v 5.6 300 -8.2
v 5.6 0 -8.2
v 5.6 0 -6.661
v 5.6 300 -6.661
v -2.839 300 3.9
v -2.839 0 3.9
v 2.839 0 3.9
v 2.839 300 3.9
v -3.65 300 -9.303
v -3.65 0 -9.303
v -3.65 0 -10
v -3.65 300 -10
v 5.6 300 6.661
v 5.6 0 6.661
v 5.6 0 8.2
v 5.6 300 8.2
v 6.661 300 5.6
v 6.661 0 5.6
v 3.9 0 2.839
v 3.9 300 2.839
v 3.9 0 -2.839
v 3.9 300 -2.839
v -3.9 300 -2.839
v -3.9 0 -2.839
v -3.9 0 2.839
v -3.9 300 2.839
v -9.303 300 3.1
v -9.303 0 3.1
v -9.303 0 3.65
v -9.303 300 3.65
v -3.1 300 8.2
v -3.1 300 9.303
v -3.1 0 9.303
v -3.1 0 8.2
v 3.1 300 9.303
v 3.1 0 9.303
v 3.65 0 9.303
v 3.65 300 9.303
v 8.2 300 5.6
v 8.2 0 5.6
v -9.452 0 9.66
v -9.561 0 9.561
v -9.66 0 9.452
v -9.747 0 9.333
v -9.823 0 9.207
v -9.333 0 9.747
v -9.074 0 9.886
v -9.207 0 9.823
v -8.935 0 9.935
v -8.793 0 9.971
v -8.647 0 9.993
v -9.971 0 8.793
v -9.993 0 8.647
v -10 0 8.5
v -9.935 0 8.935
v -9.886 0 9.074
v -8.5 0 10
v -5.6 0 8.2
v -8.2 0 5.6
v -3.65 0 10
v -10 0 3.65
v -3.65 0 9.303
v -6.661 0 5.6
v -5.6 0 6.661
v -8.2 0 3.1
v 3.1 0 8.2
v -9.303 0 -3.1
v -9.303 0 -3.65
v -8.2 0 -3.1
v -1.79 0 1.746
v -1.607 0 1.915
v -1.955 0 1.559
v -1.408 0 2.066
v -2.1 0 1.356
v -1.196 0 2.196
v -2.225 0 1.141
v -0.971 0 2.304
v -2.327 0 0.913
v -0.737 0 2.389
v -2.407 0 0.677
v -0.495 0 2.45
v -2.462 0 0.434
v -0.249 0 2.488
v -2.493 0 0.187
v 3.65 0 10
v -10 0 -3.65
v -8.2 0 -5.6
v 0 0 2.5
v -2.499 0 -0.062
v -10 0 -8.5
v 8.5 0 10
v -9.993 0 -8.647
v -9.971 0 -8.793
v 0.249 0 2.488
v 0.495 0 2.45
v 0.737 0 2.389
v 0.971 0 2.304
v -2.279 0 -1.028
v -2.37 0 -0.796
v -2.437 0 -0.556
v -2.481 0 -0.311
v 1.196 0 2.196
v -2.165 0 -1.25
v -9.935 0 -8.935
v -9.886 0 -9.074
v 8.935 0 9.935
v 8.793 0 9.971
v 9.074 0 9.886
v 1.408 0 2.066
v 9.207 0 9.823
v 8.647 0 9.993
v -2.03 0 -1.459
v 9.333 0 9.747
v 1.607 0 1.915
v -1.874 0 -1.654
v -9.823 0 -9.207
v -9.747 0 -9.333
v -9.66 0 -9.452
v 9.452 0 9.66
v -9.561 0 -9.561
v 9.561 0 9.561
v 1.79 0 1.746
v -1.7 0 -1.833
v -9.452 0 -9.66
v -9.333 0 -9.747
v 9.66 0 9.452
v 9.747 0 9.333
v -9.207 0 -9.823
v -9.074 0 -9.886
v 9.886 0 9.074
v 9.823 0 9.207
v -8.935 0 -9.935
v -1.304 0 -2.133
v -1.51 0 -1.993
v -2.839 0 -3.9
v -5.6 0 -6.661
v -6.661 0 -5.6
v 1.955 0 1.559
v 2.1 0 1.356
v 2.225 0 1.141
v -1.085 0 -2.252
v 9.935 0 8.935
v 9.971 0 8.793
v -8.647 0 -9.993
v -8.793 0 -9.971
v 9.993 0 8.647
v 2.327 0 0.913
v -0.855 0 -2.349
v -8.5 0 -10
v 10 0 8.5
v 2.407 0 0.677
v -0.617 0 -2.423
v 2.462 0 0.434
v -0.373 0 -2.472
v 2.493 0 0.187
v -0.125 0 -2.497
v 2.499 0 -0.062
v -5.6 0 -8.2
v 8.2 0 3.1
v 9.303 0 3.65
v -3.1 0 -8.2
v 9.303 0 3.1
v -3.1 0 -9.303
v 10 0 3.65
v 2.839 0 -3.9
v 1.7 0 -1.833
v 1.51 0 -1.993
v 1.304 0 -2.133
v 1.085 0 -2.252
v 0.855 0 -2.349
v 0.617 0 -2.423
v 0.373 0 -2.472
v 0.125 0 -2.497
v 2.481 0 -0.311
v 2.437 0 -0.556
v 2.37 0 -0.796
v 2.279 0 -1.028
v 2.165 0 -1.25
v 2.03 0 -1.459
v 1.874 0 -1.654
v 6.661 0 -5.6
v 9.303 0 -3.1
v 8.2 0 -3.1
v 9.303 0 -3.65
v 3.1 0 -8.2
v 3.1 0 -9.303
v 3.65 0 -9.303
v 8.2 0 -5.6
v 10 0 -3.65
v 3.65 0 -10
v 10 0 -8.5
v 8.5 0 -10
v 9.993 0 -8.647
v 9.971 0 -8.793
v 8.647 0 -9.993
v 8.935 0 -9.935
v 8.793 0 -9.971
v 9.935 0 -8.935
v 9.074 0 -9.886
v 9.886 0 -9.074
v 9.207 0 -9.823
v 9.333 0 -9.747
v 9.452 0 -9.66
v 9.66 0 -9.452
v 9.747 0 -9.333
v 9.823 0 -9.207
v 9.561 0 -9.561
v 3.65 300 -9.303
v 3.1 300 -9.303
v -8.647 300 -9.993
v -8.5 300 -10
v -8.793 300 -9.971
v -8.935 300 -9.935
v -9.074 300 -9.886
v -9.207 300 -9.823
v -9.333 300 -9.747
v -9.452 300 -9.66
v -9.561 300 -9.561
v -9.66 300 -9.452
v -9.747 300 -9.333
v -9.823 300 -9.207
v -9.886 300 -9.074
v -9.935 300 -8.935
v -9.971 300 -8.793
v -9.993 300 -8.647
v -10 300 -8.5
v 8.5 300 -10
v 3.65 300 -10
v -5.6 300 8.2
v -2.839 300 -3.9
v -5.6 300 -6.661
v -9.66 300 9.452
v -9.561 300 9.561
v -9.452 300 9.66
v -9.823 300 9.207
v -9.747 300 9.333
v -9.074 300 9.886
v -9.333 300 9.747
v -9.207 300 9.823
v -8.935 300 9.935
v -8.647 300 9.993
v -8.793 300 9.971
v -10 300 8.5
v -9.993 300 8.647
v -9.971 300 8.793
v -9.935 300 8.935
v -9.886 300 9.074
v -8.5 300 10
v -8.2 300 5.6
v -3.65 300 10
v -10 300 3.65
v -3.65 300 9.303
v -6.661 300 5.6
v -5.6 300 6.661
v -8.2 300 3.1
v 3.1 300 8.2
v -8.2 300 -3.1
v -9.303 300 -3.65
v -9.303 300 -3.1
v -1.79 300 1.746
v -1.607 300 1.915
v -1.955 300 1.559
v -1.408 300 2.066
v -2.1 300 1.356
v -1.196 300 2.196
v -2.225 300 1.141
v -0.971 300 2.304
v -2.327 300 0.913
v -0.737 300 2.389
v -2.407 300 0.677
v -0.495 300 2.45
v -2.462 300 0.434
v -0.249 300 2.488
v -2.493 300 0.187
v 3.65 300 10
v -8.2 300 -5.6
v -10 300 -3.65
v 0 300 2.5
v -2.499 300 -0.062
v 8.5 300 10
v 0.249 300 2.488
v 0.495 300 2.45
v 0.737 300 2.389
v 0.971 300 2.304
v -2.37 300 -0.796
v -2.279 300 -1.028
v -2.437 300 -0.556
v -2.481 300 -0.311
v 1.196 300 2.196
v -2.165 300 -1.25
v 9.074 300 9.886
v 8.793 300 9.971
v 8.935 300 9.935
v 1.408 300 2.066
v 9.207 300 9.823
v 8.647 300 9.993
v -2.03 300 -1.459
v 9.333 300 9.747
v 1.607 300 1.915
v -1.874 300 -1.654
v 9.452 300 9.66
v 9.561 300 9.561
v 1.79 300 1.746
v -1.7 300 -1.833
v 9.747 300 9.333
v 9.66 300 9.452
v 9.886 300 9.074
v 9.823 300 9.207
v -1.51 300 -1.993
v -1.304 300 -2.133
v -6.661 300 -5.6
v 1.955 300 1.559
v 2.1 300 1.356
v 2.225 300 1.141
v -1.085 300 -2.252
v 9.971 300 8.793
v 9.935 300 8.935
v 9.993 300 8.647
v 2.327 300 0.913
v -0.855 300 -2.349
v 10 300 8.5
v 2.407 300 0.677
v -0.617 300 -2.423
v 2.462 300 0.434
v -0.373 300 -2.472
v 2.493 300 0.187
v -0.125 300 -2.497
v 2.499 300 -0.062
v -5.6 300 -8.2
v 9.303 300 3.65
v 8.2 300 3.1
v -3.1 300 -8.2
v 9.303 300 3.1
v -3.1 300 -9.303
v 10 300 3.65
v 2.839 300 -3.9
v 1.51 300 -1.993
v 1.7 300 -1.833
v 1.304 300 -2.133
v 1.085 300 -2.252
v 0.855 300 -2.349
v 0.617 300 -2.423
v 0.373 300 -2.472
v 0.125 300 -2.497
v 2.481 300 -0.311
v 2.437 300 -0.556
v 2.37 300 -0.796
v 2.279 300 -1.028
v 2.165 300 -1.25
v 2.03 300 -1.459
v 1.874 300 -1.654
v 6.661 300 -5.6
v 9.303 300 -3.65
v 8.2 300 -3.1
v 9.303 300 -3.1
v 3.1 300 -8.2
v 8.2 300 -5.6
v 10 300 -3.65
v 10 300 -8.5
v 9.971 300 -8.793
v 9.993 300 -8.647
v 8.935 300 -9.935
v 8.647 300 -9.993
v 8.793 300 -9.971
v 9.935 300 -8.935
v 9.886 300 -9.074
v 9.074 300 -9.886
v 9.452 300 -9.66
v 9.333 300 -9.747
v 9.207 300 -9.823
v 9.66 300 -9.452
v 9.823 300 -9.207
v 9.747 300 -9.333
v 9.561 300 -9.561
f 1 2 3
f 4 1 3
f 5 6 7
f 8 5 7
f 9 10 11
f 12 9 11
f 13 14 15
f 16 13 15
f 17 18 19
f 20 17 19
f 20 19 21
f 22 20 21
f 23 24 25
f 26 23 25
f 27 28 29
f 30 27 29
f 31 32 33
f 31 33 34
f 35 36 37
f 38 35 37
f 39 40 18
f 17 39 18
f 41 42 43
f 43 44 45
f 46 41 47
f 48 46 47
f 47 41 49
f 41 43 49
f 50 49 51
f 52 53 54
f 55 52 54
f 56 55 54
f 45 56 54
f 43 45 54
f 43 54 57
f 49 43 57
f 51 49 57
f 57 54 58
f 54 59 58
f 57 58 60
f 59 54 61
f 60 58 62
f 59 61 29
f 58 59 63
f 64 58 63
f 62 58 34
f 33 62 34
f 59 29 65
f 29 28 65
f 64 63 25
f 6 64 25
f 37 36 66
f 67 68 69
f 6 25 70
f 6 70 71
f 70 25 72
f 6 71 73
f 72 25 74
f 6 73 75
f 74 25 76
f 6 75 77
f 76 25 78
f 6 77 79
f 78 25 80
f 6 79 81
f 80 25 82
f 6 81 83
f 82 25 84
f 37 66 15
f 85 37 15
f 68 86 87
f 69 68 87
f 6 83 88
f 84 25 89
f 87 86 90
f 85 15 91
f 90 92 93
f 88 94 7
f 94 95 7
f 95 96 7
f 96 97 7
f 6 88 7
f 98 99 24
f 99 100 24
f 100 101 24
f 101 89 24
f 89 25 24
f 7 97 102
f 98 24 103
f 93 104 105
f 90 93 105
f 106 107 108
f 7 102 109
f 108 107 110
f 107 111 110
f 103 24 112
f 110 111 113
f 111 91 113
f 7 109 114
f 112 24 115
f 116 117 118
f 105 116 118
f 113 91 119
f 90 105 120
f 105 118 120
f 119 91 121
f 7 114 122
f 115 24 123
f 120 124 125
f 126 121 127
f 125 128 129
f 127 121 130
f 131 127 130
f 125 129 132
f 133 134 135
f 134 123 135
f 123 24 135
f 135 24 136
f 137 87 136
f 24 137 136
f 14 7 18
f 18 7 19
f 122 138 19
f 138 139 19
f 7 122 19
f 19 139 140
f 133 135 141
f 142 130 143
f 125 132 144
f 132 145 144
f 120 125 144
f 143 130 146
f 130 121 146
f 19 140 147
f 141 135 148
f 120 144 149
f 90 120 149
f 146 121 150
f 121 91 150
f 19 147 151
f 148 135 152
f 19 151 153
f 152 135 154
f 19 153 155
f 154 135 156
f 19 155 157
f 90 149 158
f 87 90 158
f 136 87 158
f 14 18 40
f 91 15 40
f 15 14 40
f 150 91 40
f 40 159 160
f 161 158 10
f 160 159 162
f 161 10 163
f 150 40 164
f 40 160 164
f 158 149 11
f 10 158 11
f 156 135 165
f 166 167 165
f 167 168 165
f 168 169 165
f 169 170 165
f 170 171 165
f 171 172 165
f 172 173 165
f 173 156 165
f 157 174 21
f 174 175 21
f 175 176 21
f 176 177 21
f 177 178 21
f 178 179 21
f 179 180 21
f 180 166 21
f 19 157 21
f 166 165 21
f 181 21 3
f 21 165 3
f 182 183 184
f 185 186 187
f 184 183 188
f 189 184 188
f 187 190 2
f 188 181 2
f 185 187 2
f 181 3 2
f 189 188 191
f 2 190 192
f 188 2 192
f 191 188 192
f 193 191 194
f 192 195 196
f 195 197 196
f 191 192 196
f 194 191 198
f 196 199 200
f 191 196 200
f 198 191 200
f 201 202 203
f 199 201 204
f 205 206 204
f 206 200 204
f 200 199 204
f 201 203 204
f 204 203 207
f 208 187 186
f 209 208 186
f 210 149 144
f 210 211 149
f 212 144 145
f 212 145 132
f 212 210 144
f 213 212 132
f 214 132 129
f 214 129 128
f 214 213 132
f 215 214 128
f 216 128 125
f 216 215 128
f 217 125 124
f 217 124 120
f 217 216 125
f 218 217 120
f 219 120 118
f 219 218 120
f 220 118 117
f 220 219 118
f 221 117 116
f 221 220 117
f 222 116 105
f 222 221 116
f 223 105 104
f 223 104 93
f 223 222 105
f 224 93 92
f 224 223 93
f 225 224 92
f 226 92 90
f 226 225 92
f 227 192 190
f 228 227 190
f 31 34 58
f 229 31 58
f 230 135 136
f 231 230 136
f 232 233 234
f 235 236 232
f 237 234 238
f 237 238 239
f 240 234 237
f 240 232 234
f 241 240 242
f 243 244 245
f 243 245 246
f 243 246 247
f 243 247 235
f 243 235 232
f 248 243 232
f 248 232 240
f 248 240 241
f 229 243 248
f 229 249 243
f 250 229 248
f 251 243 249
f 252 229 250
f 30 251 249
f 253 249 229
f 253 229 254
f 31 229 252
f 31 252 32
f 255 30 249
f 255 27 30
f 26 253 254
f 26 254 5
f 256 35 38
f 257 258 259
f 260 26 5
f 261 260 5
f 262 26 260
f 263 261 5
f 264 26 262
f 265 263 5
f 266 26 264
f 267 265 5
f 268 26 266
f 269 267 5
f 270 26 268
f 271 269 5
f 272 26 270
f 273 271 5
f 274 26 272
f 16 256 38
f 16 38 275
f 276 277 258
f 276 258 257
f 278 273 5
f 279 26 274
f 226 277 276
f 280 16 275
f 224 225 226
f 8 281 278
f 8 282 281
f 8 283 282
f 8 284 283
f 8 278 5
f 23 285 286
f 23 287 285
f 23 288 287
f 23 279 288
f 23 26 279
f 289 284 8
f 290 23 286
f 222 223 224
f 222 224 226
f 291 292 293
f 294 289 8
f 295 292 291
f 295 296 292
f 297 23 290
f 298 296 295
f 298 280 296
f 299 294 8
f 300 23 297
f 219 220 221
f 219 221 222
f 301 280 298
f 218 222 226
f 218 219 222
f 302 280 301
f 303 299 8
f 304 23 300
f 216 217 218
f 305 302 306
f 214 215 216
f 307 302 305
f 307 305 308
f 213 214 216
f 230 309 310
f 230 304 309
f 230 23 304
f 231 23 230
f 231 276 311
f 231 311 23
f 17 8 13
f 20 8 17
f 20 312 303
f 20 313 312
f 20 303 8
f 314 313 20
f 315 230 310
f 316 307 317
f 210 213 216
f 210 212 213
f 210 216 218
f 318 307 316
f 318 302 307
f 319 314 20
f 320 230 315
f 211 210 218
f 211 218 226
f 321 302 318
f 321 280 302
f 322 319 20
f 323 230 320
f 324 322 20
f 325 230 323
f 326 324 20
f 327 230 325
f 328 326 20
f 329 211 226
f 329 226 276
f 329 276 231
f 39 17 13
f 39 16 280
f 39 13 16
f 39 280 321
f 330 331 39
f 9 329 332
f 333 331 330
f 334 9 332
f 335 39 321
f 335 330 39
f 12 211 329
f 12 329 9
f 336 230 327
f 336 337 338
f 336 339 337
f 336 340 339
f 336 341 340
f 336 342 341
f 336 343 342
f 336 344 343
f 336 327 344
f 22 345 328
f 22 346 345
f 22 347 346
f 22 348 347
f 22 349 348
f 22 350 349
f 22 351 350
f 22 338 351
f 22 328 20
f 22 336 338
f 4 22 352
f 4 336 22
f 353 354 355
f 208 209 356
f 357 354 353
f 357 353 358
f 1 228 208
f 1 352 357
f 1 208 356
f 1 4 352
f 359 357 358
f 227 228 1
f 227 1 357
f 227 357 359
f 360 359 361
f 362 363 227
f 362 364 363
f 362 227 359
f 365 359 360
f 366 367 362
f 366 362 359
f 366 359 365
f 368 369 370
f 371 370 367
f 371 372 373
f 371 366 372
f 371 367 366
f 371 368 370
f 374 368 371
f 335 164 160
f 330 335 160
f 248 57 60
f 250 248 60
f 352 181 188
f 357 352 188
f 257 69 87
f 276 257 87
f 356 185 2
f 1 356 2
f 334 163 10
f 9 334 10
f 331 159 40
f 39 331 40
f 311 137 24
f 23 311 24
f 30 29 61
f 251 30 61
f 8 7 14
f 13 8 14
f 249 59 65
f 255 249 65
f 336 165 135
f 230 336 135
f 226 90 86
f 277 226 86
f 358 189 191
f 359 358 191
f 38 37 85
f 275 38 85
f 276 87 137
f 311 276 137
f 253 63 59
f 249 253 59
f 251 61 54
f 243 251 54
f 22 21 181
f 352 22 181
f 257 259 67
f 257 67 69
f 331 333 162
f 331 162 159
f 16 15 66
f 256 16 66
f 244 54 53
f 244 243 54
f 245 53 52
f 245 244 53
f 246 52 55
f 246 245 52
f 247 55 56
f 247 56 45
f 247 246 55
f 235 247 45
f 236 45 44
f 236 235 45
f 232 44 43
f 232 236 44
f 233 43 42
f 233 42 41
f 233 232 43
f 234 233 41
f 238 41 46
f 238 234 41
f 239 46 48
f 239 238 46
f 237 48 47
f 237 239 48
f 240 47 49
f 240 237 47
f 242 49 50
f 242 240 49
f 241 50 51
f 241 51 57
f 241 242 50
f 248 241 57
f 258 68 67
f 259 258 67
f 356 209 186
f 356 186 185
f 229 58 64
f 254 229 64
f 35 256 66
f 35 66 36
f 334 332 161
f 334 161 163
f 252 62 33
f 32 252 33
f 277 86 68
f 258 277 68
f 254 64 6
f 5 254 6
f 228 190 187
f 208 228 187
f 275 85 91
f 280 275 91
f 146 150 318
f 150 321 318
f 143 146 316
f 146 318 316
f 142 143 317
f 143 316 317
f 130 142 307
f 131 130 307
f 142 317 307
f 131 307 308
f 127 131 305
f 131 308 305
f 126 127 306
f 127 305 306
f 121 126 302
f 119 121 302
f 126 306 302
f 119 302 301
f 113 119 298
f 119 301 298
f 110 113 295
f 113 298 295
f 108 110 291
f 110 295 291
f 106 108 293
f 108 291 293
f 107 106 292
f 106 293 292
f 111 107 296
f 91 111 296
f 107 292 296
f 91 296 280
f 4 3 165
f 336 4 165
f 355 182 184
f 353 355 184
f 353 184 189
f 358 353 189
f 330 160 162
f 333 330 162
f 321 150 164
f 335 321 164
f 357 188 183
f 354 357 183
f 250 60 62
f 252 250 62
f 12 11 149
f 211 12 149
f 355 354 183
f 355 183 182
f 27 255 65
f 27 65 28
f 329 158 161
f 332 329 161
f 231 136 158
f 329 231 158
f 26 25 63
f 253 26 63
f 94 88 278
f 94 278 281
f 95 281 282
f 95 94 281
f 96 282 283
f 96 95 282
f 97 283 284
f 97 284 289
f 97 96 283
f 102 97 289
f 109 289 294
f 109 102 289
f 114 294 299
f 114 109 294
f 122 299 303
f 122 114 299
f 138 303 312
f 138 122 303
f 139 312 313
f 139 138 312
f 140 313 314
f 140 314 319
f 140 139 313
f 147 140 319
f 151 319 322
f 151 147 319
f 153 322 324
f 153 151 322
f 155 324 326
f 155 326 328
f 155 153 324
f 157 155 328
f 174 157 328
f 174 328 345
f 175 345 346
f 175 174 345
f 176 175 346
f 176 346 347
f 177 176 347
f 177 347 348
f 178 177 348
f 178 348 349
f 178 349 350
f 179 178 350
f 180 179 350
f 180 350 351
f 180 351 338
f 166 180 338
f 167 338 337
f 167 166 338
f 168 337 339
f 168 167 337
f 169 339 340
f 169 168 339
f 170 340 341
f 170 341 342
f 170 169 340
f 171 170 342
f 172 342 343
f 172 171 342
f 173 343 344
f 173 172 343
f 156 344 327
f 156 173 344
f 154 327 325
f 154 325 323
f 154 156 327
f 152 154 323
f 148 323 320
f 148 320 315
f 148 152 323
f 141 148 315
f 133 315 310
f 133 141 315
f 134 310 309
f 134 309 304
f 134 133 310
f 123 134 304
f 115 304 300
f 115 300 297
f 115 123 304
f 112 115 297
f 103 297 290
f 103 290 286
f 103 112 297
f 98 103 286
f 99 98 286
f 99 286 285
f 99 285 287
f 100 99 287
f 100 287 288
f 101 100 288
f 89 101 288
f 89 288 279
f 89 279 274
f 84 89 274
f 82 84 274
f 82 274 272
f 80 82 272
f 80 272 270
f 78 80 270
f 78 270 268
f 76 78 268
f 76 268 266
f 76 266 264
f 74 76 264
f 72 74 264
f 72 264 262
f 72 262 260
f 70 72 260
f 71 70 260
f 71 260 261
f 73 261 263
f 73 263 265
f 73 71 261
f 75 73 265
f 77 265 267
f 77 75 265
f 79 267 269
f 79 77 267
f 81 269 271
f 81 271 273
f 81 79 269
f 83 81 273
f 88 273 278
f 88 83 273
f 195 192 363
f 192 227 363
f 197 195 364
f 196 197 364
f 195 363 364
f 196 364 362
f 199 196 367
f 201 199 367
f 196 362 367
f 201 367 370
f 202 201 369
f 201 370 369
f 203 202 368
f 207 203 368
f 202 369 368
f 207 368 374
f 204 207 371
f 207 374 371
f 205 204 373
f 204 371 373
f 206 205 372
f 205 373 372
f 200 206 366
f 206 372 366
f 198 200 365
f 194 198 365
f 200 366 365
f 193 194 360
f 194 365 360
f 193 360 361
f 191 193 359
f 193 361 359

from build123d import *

# Parameters (mm, degrees)
SKETCH_1_R      = 2.5
EXTRUDE_1_DEPTH = 300
FILLET_1_R      = 1.5


with BuildPart() as part:
    # 草图1 → 凸台-拉伸1 (new body)
    with BuildSketch(Plane(origin=(0, 0, 0), x_dir=(1, 0, 0), z_dir=(0, 1, 0))):
        Polygon((10, 10), (3.65, 10), (3.65, 9.303257497), (3.1, 9.303257497), (3.1, 8.2), (5.6, 8.2), (5.6, 6.660660172), (2.839339828, 3.9), (-2.839339828, 3.9), (-5.6, 6.660660172), (-5.6, 8.2), (-3.1, 8.2), (-3.1, 9.303257497), (-3.65, 9.303257497), (-3.65, 10), (-10, 10), (-10, 3.65), (-9.303257497, 3.65), (-9.303257497, 3.1), (-8.2, 3.1), (-8.2, 5.6), (-6.660660172, 5.6), (-3.9, 2.839339828), (-3.9, -2.839339828), (-6.660660172, -5.6), (-8.2, -5.6), (-8.2, -3.1), (-9.303257497, -3.1), (-9.303257497, -3.65), (-10, -3.65), (-10, -10), (-3.65, -10), (-3.65, -9.303257497), (-3.1, -9.303257497), (-3.1, -8.2), (-5.6, -8.2), (-5.6, -6.660660172), (-2.839339828, -3.9), (2.839339828, -3.9), (5.6, -6.660660172), (5.6, -8.2), (3.1, -8.2), (3.1, -9.303257497), (3.65, -9.303257497), (3.65, -10), (10, -10), (10, -3.65), (9.303257497, -3.65), (9.303257497, -3.1), (8.2, -3.1), (8.2, -5.6), (6.660660172, -5.6), (3.9, -2.839339828), (3.9, 2.839339828), (6.660660172, 5.6), (8.2, 5.6), (8.2, 3.1), (9.303257497, 3.1), (9.303257497, 3.65), (10, 3.65), align=None)
        with Locations(Location((0, 0, 0), (0, 0, 270))):
            Circle(SKETCH_1_R, mode=Mode.SUBTRACT)
    extrude(amount=EXTRUDE_1_DEPTH)

    # 圆角1
    fillet_1_edges = [part.edges().sort_by_distance(p)[0] for p in [
        (10, 150, 10),
        (-10, 150, 10),
        (-10, 150, -10),
        (10, 150, -10),
    ]]
    fillet(fillet_1_edges, radius=FILLET_1_R)


solid = part.part
